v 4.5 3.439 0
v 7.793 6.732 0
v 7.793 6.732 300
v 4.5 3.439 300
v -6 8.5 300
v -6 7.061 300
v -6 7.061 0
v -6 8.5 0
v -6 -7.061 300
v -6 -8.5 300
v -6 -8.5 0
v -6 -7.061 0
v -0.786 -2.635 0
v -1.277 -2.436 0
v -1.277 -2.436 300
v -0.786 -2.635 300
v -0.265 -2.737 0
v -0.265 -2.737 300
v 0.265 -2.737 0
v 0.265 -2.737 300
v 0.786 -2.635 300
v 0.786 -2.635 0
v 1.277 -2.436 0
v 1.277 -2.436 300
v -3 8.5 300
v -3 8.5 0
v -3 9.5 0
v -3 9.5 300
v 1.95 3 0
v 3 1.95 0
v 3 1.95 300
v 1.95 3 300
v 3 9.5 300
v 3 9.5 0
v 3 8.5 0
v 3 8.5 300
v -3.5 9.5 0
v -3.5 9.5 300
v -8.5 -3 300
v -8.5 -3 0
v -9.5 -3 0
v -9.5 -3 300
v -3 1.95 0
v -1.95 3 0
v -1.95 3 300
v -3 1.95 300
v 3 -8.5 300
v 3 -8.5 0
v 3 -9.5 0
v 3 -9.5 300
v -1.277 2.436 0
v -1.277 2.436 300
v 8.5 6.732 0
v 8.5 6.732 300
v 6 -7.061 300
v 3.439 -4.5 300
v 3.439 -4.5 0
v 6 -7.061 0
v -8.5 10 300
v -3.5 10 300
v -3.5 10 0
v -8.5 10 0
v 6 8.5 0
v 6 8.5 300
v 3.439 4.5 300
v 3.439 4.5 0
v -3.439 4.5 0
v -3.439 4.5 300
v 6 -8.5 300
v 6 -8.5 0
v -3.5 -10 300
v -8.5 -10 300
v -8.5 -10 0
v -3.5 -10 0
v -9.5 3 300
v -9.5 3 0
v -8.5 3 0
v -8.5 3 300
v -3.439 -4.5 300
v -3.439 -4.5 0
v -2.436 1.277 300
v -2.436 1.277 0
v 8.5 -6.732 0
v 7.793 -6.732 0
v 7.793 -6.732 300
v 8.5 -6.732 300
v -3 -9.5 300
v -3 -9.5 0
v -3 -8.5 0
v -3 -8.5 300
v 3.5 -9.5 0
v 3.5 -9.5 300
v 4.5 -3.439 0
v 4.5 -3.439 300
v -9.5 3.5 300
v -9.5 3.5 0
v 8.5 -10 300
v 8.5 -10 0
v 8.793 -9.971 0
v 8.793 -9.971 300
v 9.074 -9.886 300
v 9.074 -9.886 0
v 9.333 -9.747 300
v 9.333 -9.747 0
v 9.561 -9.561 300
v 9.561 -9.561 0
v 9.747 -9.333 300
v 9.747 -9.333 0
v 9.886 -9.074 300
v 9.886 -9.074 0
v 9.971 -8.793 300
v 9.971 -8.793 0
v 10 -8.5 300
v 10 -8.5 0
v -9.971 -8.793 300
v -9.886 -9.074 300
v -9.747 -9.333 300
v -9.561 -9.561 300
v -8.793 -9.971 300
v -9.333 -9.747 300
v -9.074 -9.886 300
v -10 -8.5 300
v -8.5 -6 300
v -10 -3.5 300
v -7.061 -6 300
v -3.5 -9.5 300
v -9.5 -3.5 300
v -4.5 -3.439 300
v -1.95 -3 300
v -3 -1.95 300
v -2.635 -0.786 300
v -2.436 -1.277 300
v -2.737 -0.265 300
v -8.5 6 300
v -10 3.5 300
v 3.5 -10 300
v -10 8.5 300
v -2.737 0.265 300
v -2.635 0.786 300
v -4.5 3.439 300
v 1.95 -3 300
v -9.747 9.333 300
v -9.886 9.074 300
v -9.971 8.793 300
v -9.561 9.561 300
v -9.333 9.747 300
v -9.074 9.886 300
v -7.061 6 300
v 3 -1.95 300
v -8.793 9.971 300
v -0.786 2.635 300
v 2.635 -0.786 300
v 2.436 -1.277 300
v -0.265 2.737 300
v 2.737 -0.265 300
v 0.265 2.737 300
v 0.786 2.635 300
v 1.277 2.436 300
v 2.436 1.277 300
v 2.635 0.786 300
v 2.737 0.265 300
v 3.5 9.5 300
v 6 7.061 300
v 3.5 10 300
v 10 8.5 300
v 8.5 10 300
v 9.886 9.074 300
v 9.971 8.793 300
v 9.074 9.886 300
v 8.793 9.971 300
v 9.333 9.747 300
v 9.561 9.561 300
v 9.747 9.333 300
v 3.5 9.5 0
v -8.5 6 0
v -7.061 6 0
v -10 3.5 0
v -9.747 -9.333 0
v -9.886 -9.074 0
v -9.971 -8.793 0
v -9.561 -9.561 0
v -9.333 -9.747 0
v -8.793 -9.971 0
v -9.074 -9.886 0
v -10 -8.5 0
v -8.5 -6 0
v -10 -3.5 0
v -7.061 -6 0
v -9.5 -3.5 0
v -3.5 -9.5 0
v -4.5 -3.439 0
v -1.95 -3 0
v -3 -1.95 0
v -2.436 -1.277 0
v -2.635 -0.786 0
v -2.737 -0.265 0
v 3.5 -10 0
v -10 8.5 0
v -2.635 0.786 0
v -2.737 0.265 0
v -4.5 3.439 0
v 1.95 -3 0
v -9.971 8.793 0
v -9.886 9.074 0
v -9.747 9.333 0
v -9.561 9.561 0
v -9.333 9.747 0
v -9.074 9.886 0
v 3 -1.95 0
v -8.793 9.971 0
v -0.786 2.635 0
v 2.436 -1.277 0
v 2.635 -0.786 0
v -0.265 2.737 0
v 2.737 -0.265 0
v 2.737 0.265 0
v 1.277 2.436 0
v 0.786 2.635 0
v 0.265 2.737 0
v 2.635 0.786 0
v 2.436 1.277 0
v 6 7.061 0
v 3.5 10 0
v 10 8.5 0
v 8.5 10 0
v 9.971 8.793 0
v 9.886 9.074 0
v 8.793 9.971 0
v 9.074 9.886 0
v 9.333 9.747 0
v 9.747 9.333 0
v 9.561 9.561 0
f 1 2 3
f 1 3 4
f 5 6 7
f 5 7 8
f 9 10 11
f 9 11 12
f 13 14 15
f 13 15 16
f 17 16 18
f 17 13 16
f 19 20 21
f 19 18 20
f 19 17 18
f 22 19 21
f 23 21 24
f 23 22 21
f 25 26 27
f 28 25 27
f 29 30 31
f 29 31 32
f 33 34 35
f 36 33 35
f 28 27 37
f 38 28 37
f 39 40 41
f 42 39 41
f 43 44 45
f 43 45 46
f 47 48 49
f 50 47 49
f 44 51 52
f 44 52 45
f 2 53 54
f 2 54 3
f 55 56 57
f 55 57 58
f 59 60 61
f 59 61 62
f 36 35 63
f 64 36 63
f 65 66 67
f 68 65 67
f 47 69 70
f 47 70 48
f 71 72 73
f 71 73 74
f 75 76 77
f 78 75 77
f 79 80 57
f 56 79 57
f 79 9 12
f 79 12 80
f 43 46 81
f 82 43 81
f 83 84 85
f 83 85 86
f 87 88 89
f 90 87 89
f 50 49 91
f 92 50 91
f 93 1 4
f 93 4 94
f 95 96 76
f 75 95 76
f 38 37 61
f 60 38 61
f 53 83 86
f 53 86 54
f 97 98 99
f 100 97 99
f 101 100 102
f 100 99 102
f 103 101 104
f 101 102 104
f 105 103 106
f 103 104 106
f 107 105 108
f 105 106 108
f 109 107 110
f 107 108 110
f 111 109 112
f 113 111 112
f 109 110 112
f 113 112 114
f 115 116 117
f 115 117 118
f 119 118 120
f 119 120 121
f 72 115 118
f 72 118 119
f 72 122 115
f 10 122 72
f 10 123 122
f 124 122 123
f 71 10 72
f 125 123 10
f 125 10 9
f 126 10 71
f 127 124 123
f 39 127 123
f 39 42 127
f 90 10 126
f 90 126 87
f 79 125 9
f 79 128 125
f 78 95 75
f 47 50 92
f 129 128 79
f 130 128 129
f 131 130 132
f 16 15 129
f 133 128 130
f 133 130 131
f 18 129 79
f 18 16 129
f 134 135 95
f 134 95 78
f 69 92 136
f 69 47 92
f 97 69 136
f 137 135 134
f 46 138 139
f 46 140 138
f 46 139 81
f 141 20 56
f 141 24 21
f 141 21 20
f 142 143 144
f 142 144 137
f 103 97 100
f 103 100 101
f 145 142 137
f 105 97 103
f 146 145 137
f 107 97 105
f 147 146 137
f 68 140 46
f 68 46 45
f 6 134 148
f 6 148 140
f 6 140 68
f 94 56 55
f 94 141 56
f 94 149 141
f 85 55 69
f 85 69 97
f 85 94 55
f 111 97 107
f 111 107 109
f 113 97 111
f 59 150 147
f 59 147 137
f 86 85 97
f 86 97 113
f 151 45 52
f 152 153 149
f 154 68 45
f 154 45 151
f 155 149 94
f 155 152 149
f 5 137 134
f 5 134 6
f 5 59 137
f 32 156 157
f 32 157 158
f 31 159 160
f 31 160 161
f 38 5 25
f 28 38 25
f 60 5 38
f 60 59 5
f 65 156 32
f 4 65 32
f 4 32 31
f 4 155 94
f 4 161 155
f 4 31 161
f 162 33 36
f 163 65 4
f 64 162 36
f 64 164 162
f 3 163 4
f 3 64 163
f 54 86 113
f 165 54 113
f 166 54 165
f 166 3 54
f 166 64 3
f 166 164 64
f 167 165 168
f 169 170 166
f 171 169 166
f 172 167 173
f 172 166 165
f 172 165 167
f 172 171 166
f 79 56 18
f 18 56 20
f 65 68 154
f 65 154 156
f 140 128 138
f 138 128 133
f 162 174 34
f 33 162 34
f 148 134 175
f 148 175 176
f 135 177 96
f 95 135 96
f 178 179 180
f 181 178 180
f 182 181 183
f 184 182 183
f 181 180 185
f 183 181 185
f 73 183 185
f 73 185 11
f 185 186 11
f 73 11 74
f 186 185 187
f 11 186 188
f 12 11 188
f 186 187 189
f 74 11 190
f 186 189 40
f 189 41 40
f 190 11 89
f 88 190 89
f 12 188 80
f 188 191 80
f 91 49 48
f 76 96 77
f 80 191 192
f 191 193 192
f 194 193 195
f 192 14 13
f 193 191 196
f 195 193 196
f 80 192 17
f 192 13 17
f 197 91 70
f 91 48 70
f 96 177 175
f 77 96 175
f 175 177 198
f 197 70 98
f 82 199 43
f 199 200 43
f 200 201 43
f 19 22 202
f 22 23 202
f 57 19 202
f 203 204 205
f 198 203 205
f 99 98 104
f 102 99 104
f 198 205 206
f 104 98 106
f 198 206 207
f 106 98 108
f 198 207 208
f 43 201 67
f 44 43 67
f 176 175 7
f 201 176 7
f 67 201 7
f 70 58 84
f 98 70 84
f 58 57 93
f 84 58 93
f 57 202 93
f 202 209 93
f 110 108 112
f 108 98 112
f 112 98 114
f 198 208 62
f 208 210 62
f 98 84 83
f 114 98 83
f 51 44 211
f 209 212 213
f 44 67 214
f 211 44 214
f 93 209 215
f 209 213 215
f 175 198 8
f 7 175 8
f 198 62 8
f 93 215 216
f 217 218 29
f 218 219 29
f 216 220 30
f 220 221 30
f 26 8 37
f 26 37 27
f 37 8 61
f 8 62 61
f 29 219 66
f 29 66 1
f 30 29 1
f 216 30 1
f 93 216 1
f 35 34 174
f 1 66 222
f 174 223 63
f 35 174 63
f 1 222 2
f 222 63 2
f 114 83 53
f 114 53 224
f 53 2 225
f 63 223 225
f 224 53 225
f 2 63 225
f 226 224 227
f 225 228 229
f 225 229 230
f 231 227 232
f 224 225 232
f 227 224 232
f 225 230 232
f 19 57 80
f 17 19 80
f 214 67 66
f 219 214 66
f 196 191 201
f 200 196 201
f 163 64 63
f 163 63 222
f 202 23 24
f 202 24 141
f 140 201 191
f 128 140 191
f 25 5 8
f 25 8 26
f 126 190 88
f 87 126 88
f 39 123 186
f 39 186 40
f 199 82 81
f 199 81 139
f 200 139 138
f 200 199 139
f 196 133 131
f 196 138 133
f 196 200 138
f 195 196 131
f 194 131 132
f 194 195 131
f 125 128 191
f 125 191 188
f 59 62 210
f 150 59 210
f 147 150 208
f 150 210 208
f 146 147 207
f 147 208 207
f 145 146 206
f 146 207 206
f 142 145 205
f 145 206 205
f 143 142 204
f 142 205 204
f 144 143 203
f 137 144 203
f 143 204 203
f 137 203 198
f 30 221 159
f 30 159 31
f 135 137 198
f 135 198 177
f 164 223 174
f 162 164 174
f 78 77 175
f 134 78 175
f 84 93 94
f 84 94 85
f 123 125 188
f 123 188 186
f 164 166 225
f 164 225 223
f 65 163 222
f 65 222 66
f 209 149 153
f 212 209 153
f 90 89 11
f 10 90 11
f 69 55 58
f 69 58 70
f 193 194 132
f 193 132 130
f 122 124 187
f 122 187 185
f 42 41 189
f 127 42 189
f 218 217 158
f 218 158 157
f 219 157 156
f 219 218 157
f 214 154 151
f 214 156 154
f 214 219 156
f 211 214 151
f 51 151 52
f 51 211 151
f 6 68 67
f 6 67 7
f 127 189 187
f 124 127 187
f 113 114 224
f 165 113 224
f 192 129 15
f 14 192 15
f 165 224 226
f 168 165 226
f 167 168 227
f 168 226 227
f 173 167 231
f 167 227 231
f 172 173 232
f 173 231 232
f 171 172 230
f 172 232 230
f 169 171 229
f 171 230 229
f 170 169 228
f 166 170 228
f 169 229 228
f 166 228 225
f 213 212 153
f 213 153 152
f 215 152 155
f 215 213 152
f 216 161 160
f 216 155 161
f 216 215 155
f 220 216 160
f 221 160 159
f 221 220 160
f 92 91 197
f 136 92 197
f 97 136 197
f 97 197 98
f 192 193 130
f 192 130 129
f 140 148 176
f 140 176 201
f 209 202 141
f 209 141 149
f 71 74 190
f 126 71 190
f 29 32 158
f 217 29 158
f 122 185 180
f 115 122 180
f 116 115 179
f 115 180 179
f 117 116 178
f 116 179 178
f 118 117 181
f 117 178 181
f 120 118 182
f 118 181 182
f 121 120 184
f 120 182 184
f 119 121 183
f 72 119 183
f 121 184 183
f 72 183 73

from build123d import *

# Parameters (mm, degrees)
BOSS_EXTRUDE1_DEPTH = 3000
CUT_EXTRUDE1_DEPTH  = 2700


with BuildPart() as part:
    # Sketch1 → Boss-Extrude1 (new body)
    with BuildSketch(Plane.XY):
        with BuildLine():
            Line((-3.43933983, -4.5), (3.43933983, -4.5))
            Line((3.43933983, -4.5), (6, -7.06066017))
            Line((6, -7.06066017), (6, -8.5))
            Line((6, -8.5), (3, -8.5))
            Line((3, -8.5), (3, -9.5))
            Line((3, -9.5), (3.5, -9.5))
            Line((3.5, -9.5), (3.5, -10))
            Line((3.5, -10), (8.5, -10))
            ThreePointArc((8.5, -10), (9.56066017, -9.56066017), (10, -8.5))
            Line((10, -8.5), (10, 8.5))
            ThreePointArc((10, 8.5), (9.56066017, 9.56066017), (8.5, 10))
            Line((8.5, 10), (3.5, 10))
            Line((3.5, 10), (3.5, 9.5))
            Line((3.5, 9.5), (3, 9.5))
            Line((3, 9.5), (3, 8.5))
            Line((3, 8.5), (6, 8.5))
            Line((6, 8.5), (6, 7.06066017))
            Line((6, 7.06066017), (3.43933983, 4.5))
            Line((3.43933983, 4.5), (-3.43933983, 4.5))
            Line((-3.43933983, 4.5), (-6, 7.06066017))
            Line((-6, 7.06066017), (-6, 8.5))
            Line((-6, 8.5), (-3, 8.5))
            Line((-3, 8.5), (-3, 9.5))
            Line((-3, 9.5), (-3.5, 9.5))
            Line((-3.5, 9.5), (-3.5, 10))
            Line((-3.5, 10), (-8.5, 10))
            ThreePointArc((-8.5, 10), (-9.56066017, 9.56066017), (-10, 8.5))
            Line((-10, 8.5), (-10, 3.5))
            Line((-10, 3.5), (-9.5, 3.5))
            Line((-9.5, 3.5), (-9.5, 3))
            Line((-9.5, 3), (-8.5, 3))
            Line((-8.5, 3), (-8.5, 6))
            Line((-8.5, 6), (-7.06066017, 6))
            Line((-7.06066017, 6), (-4.5, 3.43933983))
            Line((-4.5, 3.43933983), (-4.5, -3.43933983))
            Line((-4.5, -3.43933983), (-7.06066017, -6))
            Line((-7.06066017, -6), (-8.5, -6))
            Line((-8.5, -6), (-8.5, -3))
            Line((-8.5, -3), (-9.5, -3))
            Line((-9.5, -3), (-9.5, -3.5))
            Line((-9.5, -3.5), (-10, -3.5))
            Line((-10, -3.5), (-10, -8.5))
            ThreePointArc((-10, -8.5), (-9.56066017, -9.56066017), (-8.5, -10))
            Line((-8.5, -10), (-3.5, -10))
            Line((-3.5, -10), (-3.5, -9.5))
            Line((-3.5, -9.5), (-3, -9.5))
            Line((-3, -9.5), (-3, -8.5))
            Line((-3, -8.5), (-6, -8.5))
            Line((-6, -8.5), (-6, -7.06066017))
            Line((-6, -7.06066017), (-3.43933983, -4.5))
        make_face()
        Polygon((8.5, 6.73223305), (7.79289322, 6.73223305), (4.5, 3.43933983), (4.5, -3.43933983), (7.79289322, -6.73223305), (8.5, -6.73223305), align=None, mode=Mode.SUBTRACT)
        with BuildLine():
            Line((-3.0001742, 1.94957327), (-2.43563636, 1.27678327))
            ThreePointArc((-2.43563636, 1.27678327), (-2.75, 0), (-2.43563636, -1.27678327))
            Line((-2.43563636, -1.27678327), (-3.0001742, -1.94957327))
            Line((-3.0001742, -1.94957327), (-1.94957327, -3.0001742))
            Line((-1.94957327, -3.0001742), (-1.27678327, -2.43563636))
            ThreePointArc((-1.27678327, -2.43563636), (0, -2.75), (1.27678327, -2.43563636))
            Line((1.27678327, -2.43563636), (1.94957327, -3.0001742))
            Line((1.94957327, -3.0001742), (3.0001742, -1.94957327))
            Line((3.0001742, -1.94957327), (2.43563636, -1.27678327))
            ThreePointArc((2.43563636, -1.27678327), (2.75, 0), (2.43563636, 1.27678327))
            Line((2.43563636, 1.27678327), (3.0001742, 1.94957327))
            Line((3.0001742, 1.94957327), (1.94957327, 3.0001742))
            Line((1.94957327, 3.0001742), (1.27678327, 2.43563636))
            ThreePointArc((1.27678327, 2.43563636), (0, 2.75), (-1.27678327, 2.43563636))
            Line((-1.27678327, 2.43563636), (-1.94957327, 3.0001742))
            Line((-1.94957327, 3.0001742), (-3.0001742, 1.94957327))
        make_face(mode=Mode.SUBTRACT)
    extrude(amount=BOSS_EXTRUDE1_DEPTH)

    # Sketch2 → Cut-Extrude1 (cut)
    with BuildSketch(Plane.XY.offset(3000)):
        with BuildLine():
            Line((-6, -7.06066017), (-3.43933983, -4.5))
            Line((-3.43933983, -4.5), (3.43933983, -4.5))
            Line((3.43933983, -4.5), (6, -7.06066017))
            Line((6, -7.06066017), (6, -8.5))
            Line((6, -8.5), (3, -8.5))
            Line((3, -8.5), (3, -9.5))
            Line((3, -9.5), (3.5, -9.5))
            Line((3.5, -9.5), (3.5, -10))
            Line((3.5, -10), (8.5, -10))
            ThreePointArc((8.5, -10), (9.56066017, -9.56066017), (10, -8.5))
            Line((10, -8.5), (10, 8.5))
            ThreePointArc((10, 8.5), (9.56066017, 9.56066017), (8.5, 10))
            Line((8.5, 10), (3.5, 10))
            Line((3.5, 10), (3.5, 9.5))
            Line((3.5, 9.5), (3, 9.5))
            Line((3, 9.5), (3, 8.5))
            Line((3, 8.5), (6, 8.5))
            Line((6, 8.5), (6, 7.06066017))
            Line((6, 7.06066017), (3.43933983, 4.5))
            Line((3.43933983, 4.5), (-3.43933983, 4.5))
            Line((-3.43933983, 4.5), (-6, 7.06066017))
            Line((-6, 7.06066017), (-6, 8.5))
            Line((-6, 8.5), (-3, 8.5))
            Line((-3, 8.5), (-3, 9.5))
            Line((-3, 9.5), (-3.5, 9.5))
            Line((-3.5, 9.5), (-3.5, 10))
            Line((-3.5, 10), (-8.5, 10))
            ThreePointArc((-8.5, 10), (-9.56066017, 9.56066017), (-10, 8.5))
            Line((-10, 8.5), (-10, 3.5))
            Line((-10, 3.5), (-9.5, 3.5))
            Line((-9.5, 3.5), (-9.5, 3))
            Line((-9.5, 3), (-8.5, 3))
            Line((-8.5, 3), (-8.5, 6))
            Line((-8.5, 6), (-7.06066017, 6))
            Line((-7.06066017, 6), (-4.5, 3.43933983))
            Line((-4.5, 3.43933983), (-4.5, -3.43933983))
            Line((-4.5, -3.43933983), (-7.06066017, -6))
            Line((-7.06066017, -6), (-8.5, -6))
            Line((-8.5, -6), (-8.5, -3))
            Line((-8.5, -3), (-9.5, -3))
            Line((-9.5, -3), (-9.5, -3.5))
            Line((-9.5, -3.5), (-10, -3.5))
            Line((-10, -3.5), (-10, -8.5))
            ThreePointArc((-10, -8.5), (-9.56066017, -9.56066017), (-8.5, -10))
            Line((-8.5, -10), (-3.5, -10))
            Line((-3.5, -10), (-3.5, -9.5))
            Line((-3.5, -9.5), (-3, -9.5))
            Line((-3, -9.5), (-3, -8.5))
            Line((-3, -8.5), (-6, -8.5))
            Line((-6, -8.5), (-6, -7.06066017))
        make_face()
    extrude(amount=-CUT_EXTRUDE1_DEPTH, mode=Mode.SUBTRACT)


solid = part.part
